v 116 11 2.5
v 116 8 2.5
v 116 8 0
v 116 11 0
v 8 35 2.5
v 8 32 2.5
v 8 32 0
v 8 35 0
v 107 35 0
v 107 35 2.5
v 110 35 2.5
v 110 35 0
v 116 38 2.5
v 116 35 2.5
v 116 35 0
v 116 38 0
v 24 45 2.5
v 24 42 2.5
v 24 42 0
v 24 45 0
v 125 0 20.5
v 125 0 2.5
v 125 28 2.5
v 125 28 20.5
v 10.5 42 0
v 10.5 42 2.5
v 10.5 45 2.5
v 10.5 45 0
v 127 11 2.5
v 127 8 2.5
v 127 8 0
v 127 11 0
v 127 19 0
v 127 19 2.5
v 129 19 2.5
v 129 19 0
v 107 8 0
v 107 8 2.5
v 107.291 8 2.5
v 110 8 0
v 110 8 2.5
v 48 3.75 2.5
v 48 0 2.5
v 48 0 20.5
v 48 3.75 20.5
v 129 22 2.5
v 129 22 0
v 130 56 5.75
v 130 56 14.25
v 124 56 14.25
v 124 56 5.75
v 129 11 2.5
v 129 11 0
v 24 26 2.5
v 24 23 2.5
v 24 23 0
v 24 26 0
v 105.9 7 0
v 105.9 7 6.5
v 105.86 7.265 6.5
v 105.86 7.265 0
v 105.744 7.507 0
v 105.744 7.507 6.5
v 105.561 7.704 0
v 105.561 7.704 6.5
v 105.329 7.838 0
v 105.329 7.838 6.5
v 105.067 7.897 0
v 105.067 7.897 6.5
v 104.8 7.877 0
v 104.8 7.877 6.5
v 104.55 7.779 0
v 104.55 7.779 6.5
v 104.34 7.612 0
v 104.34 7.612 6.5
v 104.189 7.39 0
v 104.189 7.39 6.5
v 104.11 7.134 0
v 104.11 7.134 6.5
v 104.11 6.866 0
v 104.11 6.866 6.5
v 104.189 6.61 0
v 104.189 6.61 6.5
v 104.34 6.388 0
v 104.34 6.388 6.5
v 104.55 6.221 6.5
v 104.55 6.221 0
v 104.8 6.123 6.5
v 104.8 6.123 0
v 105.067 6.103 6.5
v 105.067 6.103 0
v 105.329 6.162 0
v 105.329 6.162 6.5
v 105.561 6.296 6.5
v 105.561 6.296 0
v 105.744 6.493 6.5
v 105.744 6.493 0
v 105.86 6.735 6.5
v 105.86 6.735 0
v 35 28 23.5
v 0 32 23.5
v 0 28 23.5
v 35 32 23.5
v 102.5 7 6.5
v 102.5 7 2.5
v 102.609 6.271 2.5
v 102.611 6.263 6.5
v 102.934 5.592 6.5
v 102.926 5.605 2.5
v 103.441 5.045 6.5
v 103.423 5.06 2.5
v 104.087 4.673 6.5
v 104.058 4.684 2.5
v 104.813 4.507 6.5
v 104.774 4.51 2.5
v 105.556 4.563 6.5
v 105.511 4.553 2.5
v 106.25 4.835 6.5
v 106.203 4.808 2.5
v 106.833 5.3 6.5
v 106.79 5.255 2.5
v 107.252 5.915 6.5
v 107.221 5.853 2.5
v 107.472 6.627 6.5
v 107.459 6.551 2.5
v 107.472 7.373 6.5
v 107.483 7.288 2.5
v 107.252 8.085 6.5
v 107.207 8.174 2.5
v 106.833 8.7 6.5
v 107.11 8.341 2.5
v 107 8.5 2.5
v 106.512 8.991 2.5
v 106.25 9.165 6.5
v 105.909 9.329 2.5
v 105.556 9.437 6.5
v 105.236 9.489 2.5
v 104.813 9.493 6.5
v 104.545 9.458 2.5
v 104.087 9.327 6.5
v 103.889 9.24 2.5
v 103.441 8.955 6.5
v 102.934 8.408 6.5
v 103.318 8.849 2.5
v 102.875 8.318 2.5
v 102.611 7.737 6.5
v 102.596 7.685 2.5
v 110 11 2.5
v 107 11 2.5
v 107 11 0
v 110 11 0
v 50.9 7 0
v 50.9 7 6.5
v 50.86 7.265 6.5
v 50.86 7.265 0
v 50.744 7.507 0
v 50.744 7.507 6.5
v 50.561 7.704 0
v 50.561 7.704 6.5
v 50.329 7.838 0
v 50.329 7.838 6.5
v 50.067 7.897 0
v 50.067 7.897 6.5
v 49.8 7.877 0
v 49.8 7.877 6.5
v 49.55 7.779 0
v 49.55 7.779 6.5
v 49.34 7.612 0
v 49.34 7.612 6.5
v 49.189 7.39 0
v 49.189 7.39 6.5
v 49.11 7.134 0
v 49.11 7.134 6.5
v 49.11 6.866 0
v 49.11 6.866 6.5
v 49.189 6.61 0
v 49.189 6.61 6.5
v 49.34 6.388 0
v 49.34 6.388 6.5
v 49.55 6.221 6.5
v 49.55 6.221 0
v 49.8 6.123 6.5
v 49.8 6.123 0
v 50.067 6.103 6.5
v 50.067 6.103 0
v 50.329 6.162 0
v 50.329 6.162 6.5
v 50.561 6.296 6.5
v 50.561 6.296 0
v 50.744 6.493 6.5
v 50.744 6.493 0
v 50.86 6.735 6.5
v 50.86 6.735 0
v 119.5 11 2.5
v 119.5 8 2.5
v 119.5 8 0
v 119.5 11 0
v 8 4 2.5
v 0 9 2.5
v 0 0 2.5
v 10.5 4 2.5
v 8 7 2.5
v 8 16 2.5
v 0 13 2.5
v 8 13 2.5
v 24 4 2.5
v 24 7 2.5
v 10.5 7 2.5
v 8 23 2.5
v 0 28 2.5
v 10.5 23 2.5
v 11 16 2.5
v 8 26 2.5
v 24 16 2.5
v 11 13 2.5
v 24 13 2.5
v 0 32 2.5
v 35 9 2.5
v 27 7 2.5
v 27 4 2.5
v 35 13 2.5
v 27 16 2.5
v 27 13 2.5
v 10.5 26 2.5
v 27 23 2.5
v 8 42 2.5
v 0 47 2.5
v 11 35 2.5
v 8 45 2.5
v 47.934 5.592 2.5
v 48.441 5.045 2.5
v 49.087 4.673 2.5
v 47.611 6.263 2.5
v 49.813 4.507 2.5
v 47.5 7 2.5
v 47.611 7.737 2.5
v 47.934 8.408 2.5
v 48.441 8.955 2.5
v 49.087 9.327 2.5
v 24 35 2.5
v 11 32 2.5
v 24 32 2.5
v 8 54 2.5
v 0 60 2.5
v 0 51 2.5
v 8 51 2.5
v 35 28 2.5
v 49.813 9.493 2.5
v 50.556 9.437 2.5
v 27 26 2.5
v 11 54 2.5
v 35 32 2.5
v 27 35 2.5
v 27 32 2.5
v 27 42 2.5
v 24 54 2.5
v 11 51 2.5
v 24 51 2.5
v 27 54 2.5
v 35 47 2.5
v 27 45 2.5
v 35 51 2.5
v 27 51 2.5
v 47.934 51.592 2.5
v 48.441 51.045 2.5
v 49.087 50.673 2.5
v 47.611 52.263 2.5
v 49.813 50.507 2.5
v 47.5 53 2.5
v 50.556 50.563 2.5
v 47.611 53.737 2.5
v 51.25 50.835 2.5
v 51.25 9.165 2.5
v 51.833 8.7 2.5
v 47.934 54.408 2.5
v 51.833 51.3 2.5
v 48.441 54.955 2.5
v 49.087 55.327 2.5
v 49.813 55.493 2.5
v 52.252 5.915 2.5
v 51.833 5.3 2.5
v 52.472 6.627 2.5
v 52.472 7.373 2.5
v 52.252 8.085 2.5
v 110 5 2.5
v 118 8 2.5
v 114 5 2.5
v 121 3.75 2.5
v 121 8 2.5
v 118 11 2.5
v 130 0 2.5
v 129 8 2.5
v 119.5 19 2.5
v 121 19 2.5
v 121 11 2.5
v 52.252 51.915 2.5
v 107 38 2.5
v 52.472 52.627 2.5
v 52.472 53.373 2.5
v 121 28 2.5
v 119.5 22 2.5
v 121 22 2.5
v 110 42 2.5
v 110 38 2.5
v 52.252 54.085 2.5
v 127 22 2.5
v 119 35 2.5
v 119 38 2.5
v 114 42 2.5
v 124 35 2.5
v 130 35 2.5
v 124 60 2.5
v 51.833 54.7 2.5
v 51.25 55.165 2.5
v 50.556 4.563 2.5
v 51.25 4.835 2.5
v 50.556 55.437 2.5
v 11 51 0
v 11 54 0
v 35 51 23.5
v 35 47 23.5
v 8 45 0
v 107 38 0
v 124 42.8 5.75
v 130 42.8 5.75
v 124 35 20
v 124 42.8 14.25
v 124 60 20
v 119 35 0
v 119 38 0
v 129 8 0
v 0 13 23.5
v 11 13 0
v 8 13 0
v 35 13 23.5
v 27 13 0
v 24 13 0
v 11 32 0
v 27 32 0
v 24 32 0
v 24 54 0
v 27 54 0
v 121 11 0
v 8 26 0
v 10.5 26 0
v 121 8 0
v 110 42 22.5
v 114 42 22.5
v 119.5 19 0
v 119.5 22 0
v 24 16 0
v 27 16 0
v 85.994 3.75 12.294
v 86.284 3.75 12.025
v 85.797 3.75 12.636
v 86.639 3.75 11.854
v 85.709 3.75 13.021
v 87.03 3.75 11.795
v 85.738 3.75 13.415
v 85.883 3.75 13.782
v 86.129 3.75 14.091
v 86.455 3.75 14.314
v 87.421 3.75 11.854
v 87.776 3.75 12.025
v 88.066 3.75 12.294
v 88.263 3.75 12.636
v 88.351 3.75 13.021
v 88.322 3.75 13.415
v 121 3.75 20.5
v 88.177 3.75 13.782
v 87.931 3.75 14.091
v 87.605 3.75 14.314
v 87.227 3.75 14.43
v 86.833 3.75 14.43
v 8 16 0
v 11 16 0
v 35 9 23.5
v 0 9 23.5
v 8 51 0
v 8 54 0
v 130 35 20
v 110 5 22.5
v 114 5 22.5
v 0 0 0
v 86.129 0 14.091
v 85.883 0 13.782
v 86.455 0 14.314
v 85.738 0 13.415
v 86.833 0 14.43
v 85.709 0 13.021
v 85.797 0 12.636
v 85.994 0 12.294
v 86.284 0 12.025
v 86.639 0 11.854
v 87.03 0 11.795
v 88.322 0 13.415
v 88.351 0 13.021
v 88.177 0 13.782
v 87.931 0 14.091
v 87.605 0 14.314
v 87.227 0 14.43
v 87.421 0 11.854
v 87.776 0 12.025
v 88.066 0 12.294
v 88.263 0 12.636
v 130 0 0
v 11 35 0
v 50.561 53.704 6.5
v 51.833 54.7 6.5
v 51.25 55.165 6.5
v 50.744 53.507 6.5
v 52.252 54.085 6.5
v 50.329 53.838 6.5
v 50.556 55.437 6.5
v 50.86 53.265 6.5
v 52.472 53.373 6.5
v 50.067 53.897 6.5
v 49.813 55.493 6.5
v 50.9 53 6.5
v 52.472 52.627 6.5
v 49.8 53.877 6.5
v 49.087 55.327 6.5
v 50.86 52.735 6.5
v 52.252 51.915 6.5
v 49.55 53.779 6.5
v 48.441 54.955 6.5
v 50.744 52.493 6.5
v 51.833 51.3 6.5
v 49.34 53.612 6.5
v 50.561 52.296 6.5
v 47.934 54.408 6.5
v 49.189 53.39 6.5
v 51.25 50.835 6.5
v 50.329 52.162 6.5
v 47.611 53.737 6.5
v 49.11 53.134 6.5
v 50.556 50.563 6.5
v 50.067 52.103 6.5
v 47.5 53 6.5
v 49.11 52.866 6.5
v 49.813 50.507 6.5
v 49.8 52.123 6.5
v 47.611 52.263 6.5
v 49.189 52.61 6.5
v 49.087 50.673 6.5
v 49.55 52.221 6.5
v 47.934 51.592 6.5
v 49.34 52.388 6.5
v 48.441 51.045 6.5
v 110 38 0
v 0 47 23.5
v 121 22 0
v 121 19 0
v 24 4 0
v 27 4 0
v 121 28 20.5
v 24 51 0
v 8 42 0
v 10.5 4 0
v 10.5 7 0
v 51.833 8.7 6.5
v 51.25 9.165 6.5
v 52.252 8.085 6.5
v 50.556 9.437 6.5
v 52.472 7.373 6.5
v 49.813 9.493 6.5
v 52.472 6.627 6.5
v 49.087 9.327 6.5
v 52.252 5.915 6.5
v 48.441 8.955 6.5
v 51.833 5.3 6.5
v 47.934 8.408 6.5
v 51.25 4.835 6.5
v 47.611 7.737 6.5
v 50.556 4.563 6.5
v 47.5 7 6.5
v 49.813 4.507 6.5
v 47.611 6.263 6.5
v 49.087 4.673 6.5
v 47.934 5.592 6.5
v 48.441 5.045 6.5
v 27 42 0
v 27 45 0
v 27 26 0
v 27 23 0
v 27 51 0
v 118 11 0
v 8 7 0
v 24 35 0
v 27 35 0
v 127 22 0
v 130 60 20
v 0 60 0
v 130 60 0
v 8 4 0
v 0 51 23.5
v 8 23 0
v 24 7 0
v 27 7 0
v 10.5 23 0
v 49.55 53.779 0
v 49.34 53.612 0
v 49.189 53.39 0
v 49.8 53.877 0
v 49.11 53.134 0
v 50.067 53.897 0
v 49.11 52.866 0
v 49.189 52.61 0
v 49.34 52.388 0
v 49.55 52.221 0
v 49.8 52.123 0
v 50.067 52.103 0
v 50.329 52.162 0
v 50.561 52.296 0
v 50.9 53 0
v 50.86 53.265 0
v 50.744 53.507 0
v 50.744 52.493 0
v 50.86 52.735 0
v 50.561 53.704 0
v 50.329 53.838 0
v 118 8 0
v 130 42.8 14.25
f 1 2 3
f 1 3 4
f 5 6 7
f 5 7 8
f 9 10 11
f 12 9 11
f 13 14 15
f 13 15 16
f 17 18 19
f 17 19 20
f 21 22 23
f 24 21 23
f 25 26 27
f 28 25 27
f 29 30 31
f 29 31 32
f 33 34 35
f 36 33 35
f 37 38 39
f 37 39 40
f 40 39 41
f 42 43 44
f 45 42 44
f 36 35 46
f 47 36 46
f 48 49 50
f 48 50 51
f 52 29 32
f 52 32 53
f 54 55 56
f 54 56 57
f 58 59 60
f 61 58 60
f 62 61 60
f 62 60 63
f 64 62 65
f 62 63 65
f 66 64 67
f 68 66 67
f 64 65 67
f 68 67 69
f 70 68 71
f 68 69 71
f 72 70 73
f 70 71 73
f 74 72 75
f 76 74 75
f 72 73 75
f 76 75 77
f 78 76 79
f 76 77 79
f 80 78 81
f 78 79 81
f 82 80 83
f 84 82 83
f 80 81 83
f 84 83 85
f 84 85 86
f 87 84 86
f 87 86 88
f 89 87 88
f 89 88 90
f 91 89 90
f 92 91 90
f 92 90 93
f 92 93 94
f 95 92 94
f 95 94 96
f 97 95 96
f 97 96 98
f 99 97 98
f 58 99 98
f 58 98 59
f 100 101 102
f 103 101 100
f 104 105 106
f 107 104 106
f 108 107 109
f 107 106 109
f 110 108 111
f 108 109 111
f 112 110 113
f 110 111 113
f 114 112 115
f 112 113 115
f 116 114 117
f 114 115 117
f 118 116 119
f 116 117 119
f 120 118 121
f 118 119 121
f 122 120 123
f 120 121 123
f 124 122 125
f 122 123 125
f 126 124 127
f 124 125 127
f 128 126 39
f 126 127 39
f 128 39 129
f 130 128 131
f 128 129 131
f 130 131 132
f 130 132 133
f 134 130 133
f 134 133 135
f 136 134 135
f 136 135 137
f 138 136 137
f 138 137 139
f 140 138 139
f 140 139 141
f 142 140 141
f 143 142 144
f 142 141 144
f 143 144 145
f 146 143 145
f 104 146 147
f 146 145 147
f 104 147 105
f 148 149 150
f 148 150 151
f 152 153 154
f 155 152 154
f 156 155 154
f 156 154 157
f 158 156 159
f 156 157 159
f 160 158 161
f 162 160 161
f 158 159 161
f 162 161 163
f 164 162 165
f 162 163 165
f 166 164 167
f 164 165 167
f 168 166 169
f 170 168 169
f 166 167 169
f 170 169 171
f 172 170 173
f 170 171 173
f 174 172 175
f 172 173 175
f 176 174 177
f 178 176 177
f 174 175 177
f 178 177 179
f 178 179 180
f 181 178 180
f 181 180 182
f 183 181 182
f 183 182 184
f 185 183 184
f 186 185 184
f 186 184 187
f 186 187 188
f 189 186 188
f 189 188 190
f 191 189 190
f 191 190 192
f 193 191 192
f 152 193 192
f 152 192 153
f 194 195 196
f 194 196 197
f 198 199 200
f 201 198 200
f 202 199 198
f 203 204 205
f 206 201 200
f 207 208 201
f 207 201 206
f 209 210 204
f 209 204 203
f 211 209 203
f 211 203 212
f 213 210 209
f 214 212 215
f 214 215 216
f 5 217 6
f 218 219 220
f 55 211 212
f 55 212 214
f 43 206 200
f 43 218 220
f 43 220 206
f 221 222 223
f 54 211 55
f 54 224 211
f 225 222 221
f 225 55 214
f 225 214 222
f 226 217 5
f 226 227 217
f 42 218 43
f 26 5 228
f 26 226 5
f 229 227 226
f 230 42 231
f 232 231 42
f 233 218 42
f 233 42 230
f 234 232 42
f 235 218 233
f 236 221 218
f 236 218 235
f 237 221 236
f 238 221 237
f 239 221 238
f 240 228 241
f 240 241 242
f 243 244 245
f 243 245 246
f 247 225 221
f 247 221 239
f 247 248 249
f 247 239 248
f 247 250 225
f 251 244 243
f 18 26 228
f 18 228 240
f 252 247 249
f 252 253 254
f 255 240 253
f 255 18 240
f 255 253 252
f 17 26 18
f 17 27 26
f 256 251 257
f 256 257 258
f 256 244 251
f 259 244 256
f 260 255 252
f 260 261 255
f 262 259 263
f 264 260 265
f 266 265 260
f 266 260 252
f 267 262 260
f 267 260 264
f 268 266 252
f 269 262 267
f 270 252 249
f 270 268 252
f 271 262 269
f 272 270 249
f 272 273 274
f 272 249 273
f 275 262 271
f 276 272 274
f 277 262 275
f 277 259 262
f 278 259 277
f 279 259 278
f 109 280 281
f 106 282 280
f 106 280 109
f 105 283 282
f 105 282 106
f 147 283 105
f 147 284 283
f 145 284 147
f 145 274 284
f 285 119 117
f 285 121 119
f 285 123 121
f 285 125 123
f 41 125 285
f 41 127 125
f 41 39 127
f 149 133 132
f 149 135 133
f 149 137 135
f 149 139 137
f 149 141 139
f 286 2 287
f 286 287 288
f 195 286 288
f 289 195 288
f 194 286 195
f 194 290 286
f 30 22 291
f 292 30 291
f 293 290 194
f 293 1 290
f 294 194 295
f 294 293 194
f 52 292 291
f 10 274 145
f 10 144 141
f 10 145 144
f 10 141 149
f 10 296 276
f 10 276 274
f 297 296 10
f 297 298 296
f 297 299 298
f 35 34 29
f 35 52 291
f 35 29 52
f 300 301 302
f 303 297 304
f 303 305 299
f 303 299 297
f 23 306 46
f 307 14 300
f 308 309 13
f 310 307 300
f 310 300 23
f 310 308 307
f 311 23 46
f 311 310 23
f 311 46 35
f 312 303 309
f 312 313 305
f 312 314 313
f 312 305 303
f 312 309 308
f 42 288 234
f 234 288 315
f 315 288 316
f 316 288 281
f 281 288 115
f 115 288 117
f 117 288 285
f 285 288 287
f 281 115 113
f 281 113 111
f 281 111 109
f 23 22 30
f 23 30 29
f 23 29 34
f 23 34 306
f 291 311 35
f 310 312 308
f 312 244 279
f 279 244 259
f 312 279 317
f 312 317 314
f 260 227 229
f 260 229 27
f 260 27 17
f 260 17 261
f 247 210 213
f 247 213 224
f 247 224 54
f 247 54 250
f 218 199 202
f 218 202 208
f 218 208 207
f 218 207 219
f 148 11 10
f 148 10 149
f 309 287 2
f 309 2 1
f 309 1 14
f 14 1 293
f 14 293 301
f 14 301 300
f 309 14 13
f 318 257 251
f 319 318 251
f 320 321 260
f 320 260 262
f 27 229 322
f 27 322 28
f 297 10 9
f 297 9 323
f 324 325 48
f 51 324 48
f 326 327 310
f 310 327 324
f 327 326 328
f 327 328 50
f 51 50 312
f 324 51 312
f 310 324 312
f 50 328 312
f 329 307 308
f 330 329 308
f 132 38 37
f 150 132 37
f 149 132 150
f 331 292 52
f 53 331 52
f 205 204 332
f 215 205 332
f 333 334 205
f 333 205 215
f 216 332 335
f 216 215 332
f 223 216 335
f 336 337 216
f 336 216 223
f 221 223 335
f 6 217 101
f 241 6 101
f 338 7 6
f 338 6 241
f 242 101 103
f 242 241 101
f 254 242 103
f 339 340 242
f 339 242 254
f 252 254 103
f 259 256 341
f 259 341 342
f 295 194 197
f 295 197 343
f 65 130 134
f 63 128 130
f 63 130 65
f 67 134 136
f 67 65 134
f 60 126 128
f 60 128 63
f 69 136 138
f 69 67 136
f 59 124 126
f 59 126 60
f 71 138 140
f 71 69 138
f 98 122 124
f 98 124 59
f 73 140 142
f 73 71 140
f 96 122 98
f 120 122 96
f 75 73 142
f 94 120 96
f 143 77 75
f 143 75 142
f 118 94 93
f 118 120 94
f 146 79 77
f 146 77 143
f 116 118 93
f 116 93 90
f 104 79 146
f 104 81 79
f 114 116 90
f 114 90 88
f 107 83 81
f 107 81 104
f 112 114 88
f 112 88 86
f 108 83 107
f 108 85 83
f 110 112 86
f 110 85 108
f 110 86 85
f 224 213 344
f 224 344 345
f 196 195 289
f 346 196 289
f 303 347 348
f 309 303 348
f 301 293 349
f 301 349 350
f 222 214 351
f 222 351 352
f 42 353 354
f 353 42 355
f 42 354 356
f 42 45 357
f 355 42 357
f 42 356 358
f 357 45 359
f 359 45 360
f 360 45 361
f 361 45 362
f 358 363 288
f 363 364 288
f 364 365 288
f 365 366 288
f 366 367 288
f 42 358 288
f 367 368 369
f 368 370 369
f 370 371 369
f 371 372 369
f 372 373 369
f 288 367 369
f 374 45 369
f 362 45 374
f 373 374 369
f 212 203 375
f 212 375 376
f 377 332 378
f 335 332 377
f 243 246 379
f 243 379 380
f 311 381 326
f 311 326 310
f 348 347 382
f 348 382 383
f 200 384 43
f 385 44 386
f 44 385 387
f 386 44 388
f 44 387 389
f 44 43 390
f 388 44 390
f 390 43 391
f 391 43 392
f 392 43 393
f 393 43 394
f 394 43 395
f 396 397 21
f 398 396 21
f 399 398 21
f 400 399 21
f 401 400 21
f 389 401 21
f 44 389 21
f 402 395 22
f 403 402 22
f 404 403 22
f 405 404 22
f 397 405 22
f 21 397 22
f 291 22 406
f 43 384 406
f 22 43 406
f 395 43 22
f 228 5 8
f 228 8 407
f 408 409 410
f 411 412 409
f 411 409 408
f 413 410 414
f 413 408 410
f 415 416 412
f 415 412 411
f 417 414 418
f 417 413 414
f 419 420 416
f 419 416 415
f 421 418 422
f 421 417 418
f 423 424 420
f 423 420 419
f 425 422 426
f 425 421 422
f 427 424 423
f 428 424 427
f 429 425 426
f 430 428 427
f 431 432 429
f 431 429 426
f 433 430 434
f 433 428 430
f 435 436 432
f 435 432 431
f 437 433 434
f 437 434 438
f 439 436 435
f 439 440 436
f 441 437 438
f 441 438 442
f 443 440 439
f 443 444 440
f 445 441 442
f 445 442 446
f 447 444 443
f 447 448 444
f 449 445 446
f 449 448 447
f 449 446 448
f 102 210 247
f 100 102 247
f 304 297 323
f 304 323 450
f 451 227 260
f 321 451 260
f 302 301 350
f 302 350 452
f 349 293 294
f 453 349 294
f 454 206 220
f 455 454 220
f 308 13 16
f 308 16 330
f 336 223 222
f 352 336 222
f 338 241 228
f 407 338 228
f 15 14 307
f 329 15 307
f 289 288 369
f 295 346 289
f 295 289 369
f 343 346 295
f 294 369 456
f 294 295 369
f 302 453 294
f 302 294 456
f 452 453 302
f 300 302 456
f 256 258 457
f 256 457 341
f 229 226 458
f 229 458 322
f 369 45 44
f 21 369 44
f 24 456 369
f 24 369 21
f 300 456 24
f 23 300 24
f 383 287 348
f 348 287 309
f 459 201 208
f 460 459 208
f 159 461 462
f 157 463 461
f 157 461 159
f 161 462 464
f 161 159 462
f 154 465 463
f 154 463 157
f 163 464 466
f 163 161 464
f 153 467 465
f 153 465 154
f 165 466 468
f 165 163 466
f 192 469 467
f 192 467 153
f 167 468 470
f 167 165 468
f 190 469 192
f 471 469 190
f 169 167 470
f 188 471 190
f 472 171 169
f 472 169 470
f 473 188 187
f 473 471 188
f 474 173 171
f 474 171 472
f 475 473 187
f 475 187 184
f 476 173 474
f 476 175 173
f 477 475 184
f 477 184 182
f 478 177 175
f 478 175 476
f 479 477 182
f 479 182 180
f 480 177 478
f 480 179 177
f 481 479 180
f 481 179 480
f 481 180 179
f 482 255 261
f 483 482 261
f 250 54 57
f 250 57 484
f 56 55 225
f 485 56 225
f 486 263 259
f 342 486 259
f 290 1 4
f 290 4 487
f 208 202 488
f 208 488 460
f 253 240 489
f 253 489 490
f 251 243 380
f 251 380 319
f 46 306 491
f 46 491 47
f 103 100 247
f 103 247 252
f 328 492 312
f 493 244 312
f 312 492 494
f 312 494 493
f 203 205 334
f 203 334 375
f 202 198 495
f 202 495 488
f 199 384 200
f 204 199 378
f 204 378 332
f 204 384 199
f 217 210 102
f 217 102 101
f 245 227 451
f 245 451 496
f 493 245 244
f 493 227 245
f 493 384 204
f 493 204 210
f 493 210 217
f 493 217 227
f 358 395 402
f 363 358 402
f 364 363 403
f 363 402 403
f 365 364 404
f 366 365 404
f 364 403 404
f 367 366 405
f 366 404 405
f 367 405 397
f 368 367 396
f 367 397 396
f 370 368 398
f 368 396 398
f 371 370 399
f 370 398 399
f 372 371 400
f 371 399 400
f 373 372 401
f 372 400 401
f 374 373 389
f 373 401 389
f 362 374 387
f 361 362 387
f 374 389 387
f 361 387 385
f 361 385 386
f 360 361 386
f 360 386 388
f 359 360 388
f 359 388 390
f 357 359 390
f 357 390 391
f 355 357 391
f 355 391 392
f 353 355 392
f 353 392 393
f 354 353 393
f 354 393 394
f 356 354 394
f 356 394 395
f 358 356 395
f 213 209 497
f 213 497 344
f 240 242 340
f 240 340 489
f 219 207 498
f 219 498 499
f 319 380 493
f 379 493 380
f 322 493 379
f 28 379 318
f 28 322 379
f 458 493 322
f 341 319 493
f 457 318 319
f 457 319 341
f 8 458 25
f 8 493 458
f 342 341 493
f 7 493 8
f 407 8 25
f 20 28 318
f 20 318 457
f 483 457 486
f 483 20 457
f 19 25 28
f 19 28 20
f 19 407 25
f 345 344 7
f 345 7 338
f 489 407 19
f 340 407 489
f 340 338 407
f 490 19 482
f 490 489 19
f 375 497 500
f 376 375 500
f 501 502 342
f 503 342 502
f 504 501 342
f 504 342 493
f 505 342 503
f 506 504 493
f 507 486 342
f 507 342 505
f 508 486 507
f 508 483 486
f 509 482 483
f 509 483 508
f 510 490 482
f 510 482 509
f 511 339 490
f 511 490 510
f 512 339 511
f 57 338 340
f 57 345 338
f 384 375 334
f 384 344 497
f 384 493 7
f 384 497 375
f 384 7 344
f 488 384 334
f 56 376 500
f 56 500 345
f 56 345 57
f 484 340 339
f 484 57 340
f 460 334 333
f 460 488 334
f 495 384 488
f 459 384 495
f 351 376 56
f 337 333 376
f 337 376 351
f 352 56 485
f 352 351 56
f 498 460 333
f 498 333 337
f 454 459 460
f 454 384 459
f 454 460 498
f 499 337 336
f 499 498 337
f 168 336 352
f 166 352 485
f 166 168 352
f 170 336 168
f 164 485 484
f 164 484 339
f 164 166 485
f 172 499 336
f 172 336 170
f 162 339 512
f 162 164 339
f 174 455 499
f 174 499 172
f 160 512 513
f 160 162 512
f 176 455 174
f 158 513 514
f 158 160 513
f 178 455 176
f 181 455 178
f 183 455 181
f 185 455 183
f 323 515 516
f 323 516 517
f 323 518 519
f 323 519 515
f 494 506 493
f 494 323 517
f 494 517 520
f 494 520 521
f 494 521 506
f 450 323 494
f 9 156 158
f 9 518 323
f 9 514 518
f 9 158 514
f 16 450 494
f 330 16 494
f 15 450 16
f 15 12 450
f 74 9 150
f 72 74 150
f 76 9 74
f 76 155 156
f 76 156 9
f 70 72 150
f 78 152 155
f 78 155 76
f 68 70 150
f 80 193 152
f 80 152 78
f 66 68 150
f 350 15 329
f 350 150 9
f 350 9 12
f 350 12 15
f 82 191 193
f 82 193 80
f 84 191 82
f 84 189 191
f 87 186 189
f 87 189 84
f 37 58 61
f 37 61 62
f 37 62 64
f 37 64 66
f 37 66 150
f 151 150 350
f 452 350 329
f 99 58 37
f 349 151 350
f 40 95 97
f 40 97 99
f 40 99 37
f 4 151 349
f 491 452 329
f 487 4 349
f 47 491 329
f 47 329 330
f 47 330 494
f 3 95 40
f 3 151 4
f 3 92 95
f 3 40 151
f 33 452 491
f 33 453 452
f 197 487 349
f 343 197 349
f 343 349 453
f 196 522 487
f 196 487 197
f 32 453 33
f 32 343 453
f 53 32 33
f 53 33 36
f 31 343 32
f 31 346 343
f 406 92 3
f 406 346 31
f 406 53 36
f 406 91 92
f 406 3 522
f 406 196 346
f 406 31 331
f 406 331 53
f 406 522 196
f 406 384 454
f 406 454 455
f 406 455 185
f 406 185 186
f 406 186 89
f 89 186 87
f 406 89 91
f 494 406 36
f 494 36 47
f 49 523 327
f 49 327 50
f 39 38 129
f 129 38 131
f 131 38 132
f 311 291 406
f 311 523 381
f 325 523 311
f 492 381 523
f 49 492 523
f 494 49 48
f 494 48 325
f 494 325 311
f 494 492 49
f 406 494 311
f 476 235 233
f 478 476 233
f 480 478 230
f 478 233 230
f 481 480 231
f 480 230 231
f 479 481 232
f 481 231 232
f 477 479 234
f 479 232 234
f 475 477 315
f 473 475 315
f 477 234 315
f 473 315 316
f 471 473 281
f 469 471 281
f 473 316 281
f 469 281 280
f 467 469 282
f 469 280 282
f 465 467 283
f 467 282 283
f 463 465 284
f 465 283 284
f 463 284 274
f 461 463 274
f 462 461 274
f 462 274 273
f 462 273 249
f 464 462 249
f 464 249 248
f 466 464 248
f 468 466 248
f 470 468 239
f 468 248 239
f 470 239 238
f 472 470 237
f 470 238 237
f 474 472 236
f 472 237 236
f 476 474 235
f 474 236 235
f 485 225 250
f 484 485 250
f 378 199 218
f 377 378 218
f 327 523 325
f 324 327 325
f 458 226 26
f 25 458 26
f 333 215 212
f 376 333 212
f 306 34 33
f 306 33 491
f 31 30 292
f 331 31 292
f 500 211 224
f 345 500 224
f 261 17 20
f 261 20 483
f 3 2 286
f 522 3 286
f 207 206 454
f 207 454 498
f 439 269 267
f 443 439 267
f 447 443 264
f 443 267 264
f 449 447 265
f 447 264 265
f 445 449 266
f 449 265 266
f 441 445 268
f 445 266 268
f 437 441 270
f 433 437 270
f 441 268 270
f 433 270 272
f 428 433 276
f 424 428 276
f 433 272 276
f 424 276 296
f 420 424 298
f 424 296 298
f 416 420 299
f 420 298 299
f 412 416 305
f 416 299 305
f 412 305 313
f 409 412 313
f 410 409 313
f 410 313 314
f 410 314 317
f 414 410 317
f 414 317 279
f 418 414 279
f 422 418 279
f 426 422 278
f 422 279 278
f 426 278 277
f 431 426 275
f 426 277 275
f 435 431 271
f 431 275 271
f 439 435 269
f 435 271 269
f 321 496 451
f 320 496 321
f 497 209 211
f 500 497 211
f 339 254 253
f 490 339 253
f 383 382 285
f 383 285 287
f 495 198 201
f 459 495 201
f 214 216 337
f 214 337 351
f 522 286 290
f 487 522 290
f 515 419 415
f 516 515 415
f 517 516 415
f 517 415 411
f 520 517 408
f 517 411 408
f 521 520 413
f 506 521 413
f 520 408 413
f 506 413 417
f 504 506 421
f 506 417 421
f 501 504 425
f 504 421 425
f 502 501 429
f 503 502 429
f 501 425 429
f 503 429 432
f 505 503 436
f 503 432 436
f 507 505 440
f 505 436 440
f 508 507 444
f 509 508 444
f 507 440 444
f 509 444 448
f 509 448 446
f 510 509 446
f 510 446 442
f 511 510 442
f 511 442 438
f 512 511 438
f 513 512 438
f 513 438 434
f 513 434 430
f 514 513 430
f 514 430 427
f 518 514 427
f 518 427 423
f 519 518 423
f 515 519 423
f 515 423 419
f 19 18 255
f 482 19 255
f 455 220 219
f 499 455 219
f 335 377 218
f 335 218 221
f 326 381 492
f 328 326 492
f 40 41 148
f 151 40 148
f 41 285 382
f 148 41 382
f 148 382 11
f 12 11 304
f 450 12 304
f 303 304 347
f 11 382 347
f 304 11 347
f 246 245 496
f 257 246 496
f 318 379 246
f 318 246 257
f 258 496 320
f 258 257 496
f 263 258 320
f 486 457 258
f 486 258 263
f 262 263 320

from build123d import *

# Parameters (mm, degrees)
SKETCH1_W           = 130
SKETCH1_H           = 60
BOSS_EXTRUDE1_DEPTH = 2.5
SKETCH2_R           = 2.5
BOSS_EXTRUDE2_DEPTH = 4
SKETCH3_W           = 4
SKETCH3_H           = 37
BOSS_EXTRUDE3_DEPTH = 20
SKETCH4_W           = 4
SKETCH4_H           = 28
BOSS_EXTRUDE4_DEPTH = 18
SKETCH5_R           = 0.9
CUT_EXTRUDE1_DEPTH  = 145.069427708
SKETCH6_W           = 3
SKETCH6_H           = 3
SKETCH6_W_2         = 1.5
SKETCH6_W_3         = 2
CUT_EXTRUDE2_DEPTH  = 145.568322948
SKETCH7_W           = 20
SKETCH7_H           = 25
SKETCH7_W_2         = 8.5
SKETCH7_H_2         = 13.2
BOSS_EXTRUDE5_DEPTH = 6
SKETCH8_W           = 35
SKETCH8_H           = 4
BOSS_EXTRUDE6_DEPTH = 21
SKETCH9_W           = 3
SKETCH9_H           = 3
SKETCH9_W_2         = 2.5
CUT_EXTRUDE3_DEPTH  = 145.710054937
SKETCH11_W          = 77
SKETCH11_H          = 20.5
BOSS_EXTRUDE8_DEPTH = 3.75
SKETCH12_R          = 1.325
CUT_EXTRUDE4_DEPTH  = 146.09393509


with BuildPart() as part:
    # Sketch1 → Boss-Extrude1 (new body)
    with BuildSketch(Plane.XY):
        with Locations((65, 30)):
            Rectangle(SKETCH1_W, SKETCH1_H)
    extrude(amount=BOSS_EXTRUDE1_DEPTH)

    # Sketch2 → Boss-Extrude2 (add)
    with BuildSketch(Plane.XY.offset(2.5)):
        with Locations(Location((50, 7, 0), (0, 0, 180))):
            Circle(SKETCH2_R)
        with Locations(Location((105, 7, 0), (0, 0, 180))):
            Circle(SKETCH2_R)
        with Locations(Location((50, 53, 0), (0, 0, 180))):
            Circle(SKETCH2_R)
    extrude(amount=BOSS_EXTRUDE2_DEPTH)

    # Sketch3 → Boss-Extrude3 (add)
    with BuildSketch(Plane.XY.offset(2.5)):
        with Locations((112, 23.5)):
            Rectangle(SKETCH3_W, SKETCH3_H)
    extrude(amount=BOSS_EXTRUDE3_DEPTH)

    # Sketch4 → Boss-Extrude4 (add)
    with BuildSketch(Plane.XY.offset(2.5)):
        with Locations((123, 14)):
            Rectangle(SKETCH4_W, SKETCH4_H)
    extrude(amount=BOSS_EXTRUDE4_DEPTH)

    # Sketch5 → Cut-Extrude1 (cut, through all)
    with BuildSketch(Plane.XY.offset(6.5)):
        with Locations((105, 7)):
            Circle(SKETCH5_R)
        with Locations((50, 7)):
            Circle(SKETCH5_R)
        with Locations((50, 53)):
            Circle(SKETCH5_R)
    extrude(amount=-CUT_EXTRUDE1_DEPTH, mode=Mode.SUBTRACT)

    # Sketch6 → Cut-Extrude2 (cut, through all)
    with BuildSketch(Plane.XY.offset(2.5)):
        with Locations((108.5, 36.5)):
            Rectangle(SKETCH6_W, SKETCH6_H)
        with Locations((108.5, 9.5)):
            Rectangle(SKETCH6_W, SKETCH6_H)
        with Locations((120.25, 20.5)):
            Rectangle(SKETCH6_W_2, SKETCH6_H)
        with Locations((128, 20.5)):
            Rectangle(SKETCH6_W_3, SKETCH6_H)
        with Locations((128, 9.5)):
            Rectangle(SKETCH6_W_3, SKETCH6_H)
        with Locations((120.25, 9.5)):
            Rectangle(SKETCH6_W_2, SKETCH6_H)
        with Locations((117, 9.5)):
            Rectangle(SKETCH6_W_3, SKETCH6_H)
        with Locations((117.5, 36.5)):
            Rectangle(SKETCH6_W, SKETCH6_H)
    extrude(amount=-CUT_EXTRUDE2_DEPTH, mode=Mode.SUBTRACT)

    # Sketch7 → Boss-Extrude5 (add)
    with BuildSketch(Plane(origin=(130, 0, 0), x_dir=(0, 0, -1), z_dir=(1, 0, 0))):
        with Locations((-10, 47.5)):
            Rectangle(SKETCH7_W, SKETCH7_H)
        with Locations((-10, 49.4)):
            Rectangle(SKETCH7_W_2, SKETCH7_H_2, mode=Mode.SUBTRACT)
    extrude(amount=-BOSS_EXTRUDE5_DEPTH)

    # Sketch8 → Boss-Extrude6 (add)
    with BuildSketch(Plane.XY.offset(2.5)):
        with Locations((17.5, 49)):
            Rectangle(SKETCH8_W, SKETCH8_H)
        with Locations((17.5, 30)):
            Rectangle(SKETCH8_W, SKETCH8_H)
        with Locations((17.5, 11)):
            Rectangle(SKETCH8_W, SKETCH8_H)
    extrude(amount=BOSS_EXTRUDE6_DEPTH)

    # Sketch9 → Cut-Extrude3 (cut, through all)
    with BuildSketch(Plane.XY.offset(2.5)):
        with Locations((9.5, 14.5)):
            Rectangle(SKETCH9_W, SKETCH9_H)
        with Locations((25.5, 14.5)):
            Rectangle(SKETCH9_W, SKETCH9_H)
        with Locations((9.5, 33.5)):
            Rectangle(SKETCH9_W, SKETCH9_H)
        with Locations((25.5, 33.5)):
            Rectangle(SKETCH9_W, SKETCH9_H)
        with Locations((9.5, 52.5)):
            Rectangle(SKETCH9_W, SKETCH9_H)
        with Locations((25.5, 52.5)):
            Rectangle(SKETCH9_W, SKETCH9_H)
        with Locations((9.25, 5.5)):
            Rectangle(SKETCH9_W_2, SKETCH9_H)
        with Locations((9.25, 24.5)):
            Rectangle(SKETCH9_W_2, SKETCH9_H)
        with Locations((25.5, 24.5)):
            Rectangle(SKETCH9_W, SKETCH9_H)
        with Locations((25.5, 5.5)):
            Rectangle(SKETCH9_W, SKETCH9_H)
        with Locations((25.5, 43.5)):
            Rectangle(SKETCH9_W, SKETCH9_H)
        with Locations((9.25, 43.5)):
            Rectangle(SKETCH9_W_2, SKETCH9_H)
    extrude(amount=-CUT_EXTRUDE3_DEPTH, mode=Mode.SUBTRACT)

    # Sketch11 → Boss-Extrude8 (add)
    with BuildSketch(Plane.XZ):
        with Locations((86.5, 10.25)):
            Rectangle(SKETCH11_W, SKETCH11_H)
    extrude(amount=-BOSS_EXTRUDE8_DEPTH)

    # Sketch12 → Cut-Extrude4 (cut, through all)
    with BuildSketch(Plane.XZ):
        with Locations(Location((87.03, 13.12, 0), (0, 0, 270))):
            Circle(SKETCH12_R)
    extrude(amount=-CUT_EXTRUDE4_DEPTH, mode=Mode.SUBTRACT)


solid = part.part
